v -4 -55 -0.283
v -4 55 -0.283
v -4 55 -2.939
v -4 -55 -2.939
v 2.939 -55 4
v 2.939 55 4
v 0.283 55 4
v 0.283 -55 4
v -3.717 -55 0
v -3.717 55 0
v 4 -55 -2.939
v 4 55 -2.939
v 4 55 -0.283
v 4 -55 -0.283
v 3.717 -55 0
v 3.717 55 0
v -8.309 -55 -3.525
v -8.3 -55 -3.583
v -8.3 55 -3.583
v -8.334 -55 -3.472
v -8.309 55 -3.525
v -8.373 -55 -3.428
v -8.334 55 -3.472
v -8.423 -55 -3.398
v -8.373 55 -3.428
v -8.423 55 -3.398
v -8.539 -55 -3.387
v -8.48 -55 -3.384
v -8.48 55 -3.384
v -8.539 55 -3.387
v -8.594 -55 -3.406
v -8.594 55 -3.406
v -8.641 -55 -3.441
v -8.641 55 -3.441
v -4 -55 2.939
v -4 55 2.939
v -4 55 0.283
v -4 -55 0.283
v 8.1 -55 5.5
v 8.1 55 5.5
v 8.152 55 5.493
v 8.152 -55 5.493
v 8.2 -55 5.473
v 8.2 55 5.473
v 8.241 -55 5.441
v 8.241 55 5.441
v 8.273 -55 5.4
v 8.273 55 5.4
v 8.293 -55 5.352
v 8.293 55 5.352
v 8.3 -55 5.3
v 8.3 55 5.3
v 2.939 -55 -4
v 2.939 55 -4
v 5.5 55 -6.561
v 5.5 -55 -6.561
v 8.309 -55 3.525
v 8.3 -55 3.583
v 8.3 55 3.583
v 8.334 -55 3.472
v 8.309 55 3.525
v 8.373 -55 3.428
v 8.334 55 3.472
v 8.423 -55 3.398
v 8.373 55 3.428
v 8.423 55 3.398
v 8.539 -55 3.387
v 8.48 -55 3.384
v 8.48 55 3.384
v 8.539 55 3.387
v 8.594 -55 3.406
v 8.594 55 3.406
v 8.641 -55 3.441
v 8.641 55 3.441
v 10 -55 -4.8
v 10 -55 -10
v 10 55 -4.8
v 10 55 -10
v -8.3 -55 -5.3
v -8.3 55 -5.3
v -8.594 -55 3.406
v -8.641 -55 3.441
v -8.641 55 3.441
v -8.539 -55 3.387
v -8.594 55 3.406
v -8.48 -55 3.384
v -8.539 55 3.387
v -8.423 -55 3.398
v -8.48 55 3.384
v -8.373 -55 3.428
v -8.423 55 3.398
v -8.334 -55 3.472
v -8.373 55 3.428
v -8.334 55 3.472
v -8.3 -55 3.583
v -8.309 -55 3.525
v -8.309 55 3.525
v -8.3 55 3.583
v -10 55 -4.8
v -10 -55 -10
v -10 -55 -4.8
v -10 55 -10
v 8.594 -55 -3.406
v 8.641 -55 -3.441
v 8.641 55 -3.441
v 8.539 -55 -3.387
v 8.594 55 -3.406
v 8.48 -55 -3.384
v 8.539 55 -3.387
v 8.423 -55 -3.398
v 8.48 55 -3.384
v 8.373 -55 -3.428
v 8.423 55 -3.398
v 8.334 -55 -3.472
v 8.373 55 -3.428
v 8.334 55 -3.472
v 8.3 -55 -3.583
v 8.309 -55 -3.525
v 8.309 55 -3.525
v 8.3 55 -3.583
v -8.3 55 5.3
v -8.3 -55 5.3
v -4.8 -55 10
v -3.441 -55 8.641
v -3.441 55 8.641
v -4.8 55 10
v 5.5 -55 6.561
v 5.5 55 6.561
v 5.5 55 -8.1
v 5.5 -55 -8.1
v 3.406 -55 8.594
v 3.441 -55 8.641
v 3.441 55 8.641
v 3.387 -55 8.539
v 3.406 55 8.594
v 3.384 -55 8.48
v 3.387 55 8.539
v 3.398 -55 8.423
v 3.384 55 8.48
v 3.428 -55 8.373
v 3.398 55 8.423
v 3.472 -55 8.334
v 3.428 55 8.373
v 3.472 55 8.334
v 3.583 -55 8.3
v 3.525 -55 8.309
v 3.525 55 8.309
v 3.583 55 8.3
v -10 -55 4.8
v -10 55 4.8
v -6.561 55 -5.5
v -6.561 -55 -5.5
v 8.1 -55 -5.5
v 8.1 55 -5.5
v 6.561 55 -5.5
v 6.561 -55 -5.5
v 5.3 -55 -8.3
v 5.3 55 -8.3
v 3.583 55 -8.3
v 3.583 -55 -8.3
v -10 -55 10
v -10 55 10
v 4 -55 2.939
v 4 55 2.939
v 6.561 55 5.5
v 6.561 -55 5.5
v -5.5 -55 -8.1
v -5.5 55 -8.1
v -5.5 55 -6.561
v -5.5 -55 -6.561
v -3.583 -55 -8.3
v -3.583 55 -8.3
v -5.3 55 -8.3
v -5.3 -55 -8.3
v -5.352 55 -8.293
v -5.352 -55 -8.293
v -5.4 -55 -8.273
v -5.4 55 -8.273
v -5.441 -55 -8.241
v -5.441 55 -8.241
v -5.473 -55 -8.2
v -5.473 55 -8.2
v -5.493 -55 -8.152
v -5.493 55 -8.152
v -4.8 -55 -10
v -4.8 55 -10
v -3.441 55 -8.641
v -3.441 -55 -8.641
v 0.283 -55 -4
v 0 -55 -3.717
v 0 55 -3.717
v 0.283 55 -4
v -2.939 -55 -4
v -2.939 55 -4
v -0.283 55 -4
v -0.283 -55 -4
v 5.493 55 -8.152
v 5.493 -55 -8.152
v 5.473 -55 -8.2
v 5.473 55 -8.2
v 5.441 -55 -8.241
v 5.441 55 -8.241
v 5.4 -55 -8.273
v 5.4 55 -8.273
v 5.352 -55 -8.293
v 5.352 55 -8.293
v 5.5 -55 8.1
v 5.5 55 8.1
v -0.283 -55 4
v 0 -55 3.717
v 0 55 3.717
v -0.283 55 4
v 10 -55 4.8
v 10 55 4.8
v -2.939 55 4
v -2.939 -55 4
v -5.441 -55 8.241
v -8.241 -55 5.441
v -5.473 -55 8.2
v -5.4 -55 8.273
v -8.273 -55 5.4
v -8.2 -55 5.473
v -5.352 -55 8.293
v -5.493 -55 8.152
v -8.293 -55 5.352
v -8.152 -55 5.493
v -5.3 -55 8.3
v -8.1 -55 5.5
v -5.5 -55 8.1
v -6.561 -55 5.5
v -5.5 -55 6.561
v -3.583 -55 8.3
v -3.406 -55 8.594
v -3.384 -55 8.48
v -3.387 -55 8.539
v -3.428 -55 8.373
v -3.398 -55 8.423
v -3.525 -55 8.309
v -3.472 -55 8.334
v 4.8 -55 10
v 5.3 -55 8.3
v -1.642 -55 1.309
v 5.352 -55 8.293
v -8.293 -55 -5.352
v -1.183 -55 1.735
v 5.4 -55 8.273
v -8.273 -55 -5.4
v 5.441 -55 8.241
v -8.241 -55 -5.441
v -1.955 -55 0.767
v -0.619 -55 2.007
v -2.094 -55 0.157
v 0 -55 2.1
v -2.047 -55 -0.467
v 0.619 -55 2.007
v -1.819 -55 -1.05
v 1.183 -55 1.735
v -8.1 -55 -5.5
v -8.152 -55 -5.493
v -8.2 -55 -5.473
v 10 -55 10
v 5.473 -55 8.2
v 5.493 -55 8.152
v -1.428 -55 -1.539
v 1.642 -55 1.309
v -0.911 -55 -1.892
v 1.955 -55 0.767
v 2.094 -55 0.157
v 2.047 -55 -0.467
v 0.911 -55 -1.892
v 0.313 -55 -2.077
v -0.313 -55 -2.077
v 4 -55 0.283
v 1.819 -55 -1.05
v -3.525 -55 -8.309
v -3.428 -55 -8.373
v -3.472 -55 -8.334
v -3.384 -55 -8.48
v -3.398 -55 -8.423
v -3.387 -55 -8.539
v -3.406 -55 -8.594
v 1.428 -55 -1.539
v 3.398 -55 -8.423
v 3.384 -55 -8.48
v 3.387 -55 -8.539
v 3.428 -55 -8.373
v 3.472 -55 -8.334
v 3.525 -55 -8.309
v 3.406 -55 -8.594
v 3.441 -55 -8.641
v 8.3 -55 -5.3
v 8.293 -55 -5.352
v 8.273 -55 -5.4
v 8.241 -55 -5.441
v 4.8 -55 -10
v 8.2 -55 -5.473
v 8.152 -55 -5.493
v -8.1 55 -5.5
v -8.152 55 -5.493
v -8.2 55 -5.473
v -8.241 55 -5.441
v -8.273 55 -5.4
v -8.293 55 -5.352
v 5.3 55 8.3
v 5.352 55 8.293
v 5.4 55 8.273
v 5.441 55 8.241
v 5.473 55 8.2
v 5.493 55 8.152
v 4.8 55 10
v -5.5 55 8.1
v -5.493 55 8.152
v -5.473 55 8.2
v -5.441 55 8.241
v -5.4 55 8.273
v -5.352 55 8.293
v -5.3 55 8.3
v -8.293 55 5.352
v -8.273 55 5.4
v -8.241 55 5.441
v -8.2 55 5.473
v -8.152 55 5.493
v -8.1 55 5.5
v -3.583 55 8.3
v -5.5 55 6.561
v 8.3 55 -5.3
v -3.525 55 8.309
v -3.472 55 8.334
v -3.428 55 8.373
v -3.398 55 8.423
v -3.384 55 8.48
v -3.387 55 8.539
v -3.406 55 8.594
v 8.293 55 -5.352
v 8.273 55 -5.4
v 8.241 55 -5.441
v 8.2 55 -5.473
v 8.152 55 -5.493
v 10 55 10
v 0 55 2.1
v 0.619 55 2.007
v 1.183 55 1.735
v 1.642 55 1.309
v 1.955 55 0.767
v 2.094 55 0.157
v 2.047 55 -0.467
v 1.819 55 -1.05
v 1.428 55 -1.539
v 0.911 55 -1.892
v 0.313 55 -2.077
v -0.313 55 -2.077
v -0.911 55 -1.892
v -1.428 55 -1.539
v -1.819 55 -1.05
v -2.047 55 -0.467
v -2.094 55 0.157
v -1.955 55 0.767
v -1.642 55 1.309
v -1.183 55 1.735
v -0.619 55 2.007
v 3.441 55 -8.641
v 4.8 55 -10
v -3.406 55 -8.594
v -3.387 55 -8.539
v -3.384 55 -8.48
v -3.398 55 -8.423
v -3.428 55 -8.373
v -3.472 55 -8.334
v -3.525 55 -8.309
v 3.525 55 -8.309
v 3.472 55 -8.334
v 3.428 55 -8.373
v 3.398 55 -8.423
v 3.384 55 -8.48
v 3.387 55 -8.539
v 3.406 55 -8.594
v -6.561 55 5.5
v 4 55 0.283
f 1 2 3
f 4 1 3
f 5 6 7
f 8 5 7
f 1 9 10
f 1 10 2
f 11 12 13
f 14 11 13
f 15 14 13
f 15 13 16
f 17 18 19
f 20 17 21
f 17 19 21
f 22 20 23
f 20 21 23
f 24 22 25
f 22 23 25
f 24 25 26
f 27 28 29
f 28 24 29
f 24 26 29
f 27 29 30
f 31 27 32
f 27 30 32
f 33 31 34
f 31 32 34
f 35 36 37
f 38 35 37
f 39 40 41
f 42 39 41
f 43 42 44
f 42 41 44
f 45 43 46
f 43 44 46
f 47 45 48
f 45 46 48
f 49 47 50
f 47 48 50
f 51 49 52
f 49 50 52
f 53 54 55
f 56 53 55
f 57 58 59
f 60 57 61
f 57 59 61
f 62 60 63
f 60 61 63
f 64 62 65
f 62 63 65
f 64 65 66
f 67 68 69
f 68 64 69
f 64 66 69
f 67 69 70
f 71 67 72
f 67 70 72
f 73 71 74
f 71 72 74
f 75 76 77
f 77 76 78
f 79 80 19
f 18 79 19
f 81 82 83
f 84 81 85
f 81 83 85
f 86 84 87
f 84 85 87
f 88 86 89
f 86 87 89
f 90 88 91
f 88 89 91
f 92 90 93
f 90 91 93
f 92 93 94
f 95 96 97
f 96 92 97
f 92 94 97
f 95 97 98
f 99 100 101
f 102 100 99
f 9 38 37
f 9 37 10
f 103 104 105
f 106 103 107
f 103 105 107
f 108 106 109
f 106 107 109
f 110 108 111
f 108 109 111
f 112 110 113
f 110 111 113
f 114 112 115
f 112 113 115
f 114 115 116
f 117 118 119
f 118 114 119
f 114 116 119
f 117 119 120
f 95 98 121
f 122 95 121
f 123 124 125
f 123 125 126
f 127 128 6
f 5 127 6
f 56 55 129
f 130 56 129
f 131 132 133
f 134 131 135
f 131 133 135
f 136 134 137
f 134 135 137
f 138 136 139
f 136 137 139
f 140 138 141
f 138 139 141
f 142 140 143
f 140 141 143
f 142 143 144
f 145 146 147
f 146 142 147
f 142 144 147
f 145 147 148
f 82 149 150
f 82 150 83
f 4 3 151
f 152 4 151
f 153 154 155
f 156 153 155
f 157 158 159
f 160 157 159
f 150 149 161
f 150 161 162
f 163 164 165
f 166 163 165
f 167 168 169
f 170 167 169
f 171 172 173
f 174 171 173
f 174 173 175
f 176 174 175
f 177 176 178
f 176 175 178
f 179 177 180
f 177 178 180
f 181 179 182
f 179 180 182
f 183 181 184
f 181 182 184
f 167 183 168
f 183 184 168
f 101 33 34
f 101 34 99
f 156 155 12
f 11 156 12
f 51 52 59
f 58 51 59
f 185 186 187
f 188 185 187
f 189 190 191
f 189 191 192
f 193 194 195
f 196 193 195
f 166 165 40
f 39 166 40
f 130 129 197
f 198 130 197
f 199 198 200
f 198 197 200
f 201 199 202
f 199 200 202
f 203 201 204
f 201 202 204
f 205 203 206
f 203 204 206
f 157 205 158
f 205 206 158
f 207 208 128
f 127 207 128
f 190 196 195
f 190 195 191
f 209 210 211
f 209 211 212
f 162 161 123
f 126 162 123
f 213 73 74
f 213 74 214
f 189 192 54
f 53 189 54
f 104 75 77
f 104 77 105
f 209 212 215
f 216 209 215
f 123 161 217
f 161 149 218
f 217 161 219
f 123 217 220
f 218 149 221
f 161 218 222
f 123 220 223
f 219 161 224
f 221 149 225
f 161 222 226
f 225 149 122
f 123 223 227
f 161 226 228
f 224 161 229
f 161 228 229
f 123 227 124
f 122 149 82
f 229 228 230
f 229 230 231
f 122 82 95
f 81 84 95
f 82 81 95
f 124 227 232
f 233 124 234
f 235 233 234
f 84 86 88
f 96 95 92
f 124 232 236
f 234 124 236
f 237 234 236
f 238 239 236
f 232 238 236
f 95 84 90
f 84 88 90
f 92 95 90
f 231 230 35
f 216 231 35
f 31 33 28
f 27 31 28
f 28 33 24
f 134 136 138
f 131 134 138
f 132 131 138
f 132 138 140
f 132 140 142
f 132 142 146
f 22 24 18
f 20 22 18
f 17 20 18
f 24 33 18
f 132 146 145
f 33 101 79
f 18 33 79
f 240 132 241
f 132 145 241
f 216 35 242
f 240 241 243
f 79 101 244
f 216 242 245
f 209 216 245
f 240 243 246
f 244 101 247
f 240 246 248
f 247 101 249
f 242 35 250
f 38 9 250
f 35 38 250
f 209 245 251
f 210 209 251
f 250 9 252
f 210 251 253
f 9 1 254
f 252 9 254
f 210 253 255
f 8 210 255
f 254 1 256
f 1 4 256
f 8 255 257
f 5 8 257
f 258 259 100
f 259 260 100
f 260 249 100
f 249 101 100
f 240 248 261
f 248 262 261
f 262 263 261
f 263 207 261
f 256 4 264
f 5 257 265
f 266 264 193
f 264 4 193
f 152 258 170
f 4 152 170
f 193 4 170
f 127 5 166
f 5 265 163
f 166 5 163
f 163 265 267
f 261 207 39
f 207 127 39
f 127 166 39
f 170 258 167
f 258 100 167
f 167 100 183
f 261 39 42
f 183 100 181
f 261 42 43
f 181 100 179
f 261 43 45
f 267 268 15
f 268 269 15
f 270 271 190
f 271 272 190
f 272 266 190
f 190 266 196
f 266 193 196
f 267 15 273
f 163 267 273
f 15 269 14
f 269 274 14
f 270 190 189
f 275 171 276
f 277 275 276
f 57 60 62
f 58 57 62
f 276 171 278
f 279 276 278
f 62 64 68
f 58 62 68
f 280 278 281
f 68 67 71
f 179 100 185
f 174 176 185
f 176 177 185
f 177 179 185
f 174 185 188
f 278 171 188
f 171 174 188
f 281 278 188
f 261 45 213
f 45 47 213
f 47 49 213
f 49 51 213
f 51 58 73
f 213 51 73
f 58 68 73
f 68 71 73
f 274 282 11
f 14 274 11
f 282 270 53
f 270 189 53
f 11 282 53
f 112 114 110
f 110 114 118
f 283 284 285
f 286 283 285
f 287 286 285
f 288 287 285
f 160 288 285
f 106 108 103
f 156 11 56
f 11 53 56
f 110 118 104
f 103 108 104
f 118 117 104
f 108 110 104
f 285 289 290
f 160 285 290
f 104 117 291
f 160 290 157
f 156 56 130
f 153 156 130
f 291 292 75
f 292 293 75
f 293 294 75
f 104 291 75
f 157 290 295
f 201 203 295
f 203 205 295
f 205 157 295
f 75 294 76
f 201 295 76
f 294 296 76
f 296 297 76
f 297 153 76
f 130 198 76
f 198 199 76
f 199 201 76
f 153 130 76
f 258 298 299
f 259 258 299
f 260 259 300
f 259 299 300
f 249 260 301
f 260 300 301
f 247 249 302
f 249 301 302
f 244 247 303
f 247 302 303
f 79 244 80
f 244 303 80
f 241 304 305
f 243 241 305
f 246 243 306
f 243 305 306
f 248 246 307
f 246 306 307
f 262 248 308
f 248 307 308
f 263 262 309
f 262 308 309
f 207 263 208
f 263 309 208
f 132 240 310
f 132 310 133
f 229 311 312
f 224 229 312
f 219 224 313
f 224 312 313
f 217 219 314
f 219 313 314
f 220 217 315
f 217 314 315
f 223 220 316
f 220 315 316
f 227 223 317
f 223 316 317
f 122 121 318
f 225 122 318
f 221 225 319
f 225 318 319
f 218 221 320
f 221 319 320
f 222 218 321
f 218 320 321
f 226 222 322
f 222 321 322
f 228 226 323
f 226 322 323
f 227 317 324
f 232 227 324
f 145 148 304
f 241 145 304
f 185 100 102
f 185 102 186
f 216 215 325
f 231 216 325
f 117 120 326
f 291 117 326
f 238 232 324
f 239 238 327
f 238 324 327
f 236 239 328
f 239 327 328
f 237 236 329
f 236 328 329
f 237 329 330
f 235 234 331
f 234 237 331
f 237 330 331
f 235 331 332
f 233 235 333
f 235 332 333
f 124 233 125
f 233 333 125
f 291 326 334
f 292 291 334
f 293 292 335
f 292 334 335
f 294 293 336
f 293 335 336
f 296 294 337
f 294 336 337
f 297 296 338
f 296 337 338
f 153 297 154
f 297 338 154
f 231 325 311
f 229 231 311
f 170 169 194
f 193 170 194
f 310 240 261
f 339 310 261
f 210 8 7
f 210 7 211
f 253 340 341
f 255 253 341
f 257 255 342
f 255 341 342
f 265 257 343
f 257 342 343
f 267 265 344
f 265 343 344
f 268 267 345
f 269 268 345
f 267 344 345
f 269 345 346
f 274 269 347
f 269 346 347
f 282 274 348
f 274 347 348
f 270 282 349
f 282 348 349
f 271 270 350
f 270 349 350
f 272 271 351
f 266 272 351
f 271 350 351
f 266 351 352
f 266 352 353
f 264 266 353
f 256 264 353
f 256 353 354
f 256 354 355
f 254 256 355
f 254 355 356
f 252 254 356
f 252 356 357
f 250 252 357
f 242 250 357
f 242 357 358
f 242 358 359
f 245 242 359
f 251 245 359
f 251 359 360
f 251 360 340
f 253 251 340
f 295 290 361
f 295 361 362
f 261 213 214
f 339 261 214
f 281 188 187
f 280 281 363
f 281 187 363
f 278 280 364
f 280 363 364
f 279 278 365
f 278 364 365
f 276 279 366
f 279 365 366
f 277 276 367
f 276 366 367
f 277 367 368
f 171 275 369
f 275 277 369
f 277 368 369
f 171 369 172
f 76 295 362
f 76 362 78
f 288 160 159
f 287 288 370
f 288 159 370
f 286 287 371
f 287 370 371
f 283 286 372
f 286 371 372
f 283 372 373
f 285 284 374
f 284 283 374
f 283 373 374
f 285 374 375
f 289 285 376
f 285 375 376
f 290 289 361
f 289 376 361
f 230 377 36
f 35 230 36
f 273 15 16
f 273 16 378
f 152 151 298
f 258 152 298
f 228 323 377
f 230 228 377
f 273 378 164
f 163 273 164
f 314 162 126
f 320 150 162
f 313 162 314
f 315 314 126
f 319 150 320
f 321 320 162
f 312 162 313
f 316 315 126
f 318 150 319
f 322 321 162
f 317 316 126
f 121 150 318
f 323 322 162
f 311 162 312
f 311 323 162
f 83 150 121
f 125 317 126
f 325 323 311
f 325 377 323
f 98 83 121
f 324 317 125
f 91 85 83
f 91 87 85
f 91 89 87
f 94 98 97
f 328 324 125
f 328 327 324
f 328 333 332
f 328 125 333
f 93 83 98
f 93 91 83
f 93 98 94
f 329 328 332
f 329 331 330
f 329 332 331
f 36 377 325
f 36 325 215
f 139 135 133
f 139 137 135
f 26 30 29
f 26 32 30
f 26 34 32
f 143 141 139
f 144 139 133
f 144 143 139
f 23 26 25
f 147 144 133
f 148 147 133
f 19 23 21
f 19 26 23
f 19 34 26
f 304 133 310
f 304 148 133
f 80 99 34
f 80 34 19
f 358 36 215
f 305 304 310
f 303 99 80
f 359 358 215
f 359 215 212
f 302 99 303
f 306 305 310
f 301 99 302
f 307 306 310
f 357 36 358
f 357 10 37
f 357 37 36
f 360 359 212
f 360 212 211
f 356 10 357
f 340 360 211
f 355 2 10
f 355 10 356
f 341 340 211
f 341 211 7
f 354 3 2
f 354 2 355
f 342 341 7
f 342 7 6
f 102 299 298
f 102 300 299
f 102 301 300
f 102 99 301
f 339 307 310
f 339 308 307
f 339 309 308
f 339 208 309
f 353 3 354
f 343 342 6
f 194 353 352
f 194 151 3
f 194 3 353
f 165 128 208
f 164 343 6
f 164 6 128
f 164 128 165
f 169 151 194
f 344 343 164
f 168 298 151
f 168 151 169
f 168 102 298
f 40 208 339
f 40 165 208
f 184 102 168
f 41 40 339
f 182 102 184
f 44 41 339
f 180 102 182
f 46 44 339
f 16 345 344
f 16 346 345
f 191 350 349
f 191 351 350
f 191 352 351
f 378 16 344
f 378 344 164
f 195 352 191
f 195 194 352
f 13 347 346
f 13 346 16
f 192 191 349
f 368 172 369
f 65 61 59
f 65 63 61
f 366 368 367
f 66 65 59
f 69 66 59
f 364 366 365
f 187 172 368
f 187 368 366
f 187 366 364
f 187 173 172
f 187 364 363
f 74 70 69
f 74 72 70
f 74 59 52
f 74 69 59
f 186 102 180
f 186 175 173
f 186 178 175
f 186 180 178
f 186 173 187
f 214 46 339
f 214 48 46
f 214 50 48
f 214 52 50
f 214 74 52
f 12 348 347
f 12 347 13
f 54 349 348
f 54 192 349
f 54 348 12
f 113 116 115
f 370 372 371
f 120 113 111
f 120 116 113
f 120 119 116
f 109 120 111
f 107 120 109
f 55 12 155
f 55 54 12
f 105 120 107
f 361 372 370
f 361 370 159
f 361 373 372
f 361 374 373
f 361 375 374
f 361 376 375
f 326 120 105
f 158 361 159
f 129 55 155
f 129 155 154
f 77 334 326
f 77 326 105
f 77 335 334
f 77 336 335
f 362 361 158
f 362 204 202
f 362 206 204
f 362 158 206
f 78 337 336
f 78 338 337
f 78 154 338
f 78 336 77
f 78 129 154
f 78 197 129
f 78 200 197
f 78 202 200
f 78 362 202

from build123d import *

# Parameters (mm, degrees)
BOSS_EXTRU_1_DEPTH      = 10
BOSS_EXTRU_1_DEPTH_BACK = 10
ESQUISSE1_W             = 20
ESQUISSE1_H             = 110
ESQUISSE2_R             = 2.1
ENL_V_MAT_EXTRU_1_DEPTH = 111.905365064


with BuildPart() as part:
    # Esquisse1 → Boss.-Extru.1 (new, two sides: drawn at the far end of the back side and taken through both)
    with BuildSketch(Plane.XY.offset(-BOSS_EXTRU_1_DEPTH_BACK)):
        Rectangle(ESQUISSE1_W, ESQUISSE1_H)
    extrude(amount=BOSS_EXTRU_1_DEPTH + BOSS_EXTRU_1_DEPTH_BACK)

    # Esquisse2 → Enlèv. mat.-Extru.1 (cut, through all)
    with BuildSketch(Plane(origin=(0, 55, 0), x_dir=(1, 0, 0), z_dir=(0, 1, 0))):
        with BuildLine():
            Line((-3.441421356, -8.641421356), (-4.8, -10))
            Line((-4.8, -10), (4.8, -10))
            Line((4.8, -10), (3.441421356, -8.641421356))
            ThreePointArc((3.441421356, -8.641421356), (3.398066806, -8.423463314), (3.582842712, -8.3))
            Line((3.582842712, -8.3), (5.3, -8.3))
            ThreePointArc((5.3, -8.3), (5.441421356, -8.241421356), (5.5, -8.1))
            Line((5.5, -8.1), (5.5, -6.560660172))
            Line((5.5, -6.560660172), (2.939339828, -4))
            Line((2.939339828, -4), (0.282842712, -4))
            Line((0.282842712, -4), (0, -3.717157288))
            Line((0, -3.717157288), (-0.282842712, -4))
            Line((-0.282842712, -4), (-2.939339828, -4))
            Line((-2.939339828, -4), (-5.5, -6.560660172))
            Line((-5.5, -6.560660172), (-5.5, -8.1))
            ThreePointArc((-5.5, -8.1), (-5.441421356, -8.241421356), (-5.3, -8.3))
            Line((-5.3, -8.3), (-3.582842712, -8.3))
            ThreePointArc((-3.582842712, -8.3), (-3.398066806, -8.423463314), (-3.441421356, -8.641421356))
        make_face()
        with BuildLine():
            Line((-10, 4.8), (-10, -4.8))
            Line((-10, -4.8), (-8.641421356, -3.441421356))
            ThreePointArc((-8.641421356, -3.441421356), (-8.423463314, -3.398066806), (-8.3, -3.582842712))
            Line((-8.3, -3.582842712), (-8.3, -5.3))
            ThreePointArc((-8.3, -5.3), (-8.241421356, -5.441421356), (-8.1, -5.5))
            Line((-8.1, -5.5), (-6.560660172, -5.5))
            Line((-6.560660172, -5.5), (-4, -2.939339828))
            Line((-4, -2.939339828), (-4, -0.282842712))
            Line((-4, -0.282842712), (-3.717157288, 0))
            Line((-3.717157288, 0), (-4, 0.282842712))
            Line((-4, 0.282842712), (-4, 2.939339828))
            Line((-4, 2.939339828), (-6.560660172, 5.5))
            Line((-6.560660172, 5.5), (-8.1, 5.5))
            ThreePointArc((-8.1, 5.5), (-8.241421356, 5.441421356), (-8.3, 5.3))
            Line((-8.3, 5.3), (-8.3, 3.582842712))
            ThreePointArc((-8.3, 3.582842712), (-8.423463314, 3.398066806), (-8.641421356, 3.441421356))
            Line((-8.641421356, 3.441421356), (-10, 4.8))
        make_face()
        with BuildLine():
            Line((8.641421356, -3.441421356), (10, -4.8))
            Line((10, -4.8), (10, 4.8))
            Line((10, 4.8), (8.641421356, 3.441421356))
            ThreePointArc((8.641421356, 3.441421356), (8.423463314, 3.398066806), (8.3, 3.582842712))
            Line((8.3, 3.582842712), (8.3, 5.3))
            ThreePointArc((8.3, 5.3), (8.241421356, 5.441421356), (8.1, 5.5))
            Line((8.1, 5.5), (6.560660172, 5.5))
            Line((6.560660172, 5.5), (4, 2.939339828))
            Line((4, 2.939339828), (4, 0.282842712))
            Line((4, 0.282842712), (3.717157288, 0))
            Line((3.717157288, 0), (4, -0.282842712))
            Line((4, -0.282842712), (4, -2.939339828))
            Line((4, -2.939339828), (6.560660172, -5.5))
            Line((6.560660172, -5.5), (8.1, -5.5))
            ThreePointArc((8.1, -5.5), (8.241421356, -5.441421356), (8.3, -5.3))
            Line((8.3, -5.3), (8.3, -3.582842712))
            ThreePointArc((8.3, -3.582842712), (8.423463314, -3.398066806), (8.641421356, -3.441421356))
        make_face()
        with BuildLine():
            Line((4.8, 10), (-4.8, 10))
            Line((-4.8, 10), (-3.441421356, 8.641421356))
            ThreePointArc((-3.441421356, 8.641421356), (-3.398066806, 8.423463314), (-3.582842712, 8.3))
            Line((-3.582842712, 8.3), (-5.3, 8.3))
            ThreePointArc((-5.3, 8.3), (-5.441421356, 8.241421356), (-5.5, 8.1))
            Line((-5.5, 8.1), (-5.5, 6.560660172))
            Line((-5.5, 6.560660172), (-2.939339828, 4))
            Line((-2.939339828, 4), (-0.282842712, 4))
            Line((-0.282842712, 4), (0, 3.717157288))
            Line((0, 3.717157288), (0.282842712, 4))
            Line((0.282842712, 4), (2.939339828, 4))
            Line((2.939339828, 4), (5.5, 6.560660172))
            Line((5.5, 6.560660172), (5.5, 8.1))
            ThreePointArc((5.5, 8.1), (5.441421356, 8.241421356), (5.3, 8.3))
            Line((5.3, 8.3), (3.582842712, 8.3))
            ThreePointArc((3.582842712, 8.3), (3.398066806, 8.423463314), (3.441421356, 8.641421356))
            Line((3.441421356, 8.641421356), (4.8, 10))
        make_face()
        Circle(ESQUISSE2_R)
    extrude(amount=-ENL_V_MAT_EXTRU_1_DEPTH, mode=Mode.SUBTRACT)


solid = part.part
